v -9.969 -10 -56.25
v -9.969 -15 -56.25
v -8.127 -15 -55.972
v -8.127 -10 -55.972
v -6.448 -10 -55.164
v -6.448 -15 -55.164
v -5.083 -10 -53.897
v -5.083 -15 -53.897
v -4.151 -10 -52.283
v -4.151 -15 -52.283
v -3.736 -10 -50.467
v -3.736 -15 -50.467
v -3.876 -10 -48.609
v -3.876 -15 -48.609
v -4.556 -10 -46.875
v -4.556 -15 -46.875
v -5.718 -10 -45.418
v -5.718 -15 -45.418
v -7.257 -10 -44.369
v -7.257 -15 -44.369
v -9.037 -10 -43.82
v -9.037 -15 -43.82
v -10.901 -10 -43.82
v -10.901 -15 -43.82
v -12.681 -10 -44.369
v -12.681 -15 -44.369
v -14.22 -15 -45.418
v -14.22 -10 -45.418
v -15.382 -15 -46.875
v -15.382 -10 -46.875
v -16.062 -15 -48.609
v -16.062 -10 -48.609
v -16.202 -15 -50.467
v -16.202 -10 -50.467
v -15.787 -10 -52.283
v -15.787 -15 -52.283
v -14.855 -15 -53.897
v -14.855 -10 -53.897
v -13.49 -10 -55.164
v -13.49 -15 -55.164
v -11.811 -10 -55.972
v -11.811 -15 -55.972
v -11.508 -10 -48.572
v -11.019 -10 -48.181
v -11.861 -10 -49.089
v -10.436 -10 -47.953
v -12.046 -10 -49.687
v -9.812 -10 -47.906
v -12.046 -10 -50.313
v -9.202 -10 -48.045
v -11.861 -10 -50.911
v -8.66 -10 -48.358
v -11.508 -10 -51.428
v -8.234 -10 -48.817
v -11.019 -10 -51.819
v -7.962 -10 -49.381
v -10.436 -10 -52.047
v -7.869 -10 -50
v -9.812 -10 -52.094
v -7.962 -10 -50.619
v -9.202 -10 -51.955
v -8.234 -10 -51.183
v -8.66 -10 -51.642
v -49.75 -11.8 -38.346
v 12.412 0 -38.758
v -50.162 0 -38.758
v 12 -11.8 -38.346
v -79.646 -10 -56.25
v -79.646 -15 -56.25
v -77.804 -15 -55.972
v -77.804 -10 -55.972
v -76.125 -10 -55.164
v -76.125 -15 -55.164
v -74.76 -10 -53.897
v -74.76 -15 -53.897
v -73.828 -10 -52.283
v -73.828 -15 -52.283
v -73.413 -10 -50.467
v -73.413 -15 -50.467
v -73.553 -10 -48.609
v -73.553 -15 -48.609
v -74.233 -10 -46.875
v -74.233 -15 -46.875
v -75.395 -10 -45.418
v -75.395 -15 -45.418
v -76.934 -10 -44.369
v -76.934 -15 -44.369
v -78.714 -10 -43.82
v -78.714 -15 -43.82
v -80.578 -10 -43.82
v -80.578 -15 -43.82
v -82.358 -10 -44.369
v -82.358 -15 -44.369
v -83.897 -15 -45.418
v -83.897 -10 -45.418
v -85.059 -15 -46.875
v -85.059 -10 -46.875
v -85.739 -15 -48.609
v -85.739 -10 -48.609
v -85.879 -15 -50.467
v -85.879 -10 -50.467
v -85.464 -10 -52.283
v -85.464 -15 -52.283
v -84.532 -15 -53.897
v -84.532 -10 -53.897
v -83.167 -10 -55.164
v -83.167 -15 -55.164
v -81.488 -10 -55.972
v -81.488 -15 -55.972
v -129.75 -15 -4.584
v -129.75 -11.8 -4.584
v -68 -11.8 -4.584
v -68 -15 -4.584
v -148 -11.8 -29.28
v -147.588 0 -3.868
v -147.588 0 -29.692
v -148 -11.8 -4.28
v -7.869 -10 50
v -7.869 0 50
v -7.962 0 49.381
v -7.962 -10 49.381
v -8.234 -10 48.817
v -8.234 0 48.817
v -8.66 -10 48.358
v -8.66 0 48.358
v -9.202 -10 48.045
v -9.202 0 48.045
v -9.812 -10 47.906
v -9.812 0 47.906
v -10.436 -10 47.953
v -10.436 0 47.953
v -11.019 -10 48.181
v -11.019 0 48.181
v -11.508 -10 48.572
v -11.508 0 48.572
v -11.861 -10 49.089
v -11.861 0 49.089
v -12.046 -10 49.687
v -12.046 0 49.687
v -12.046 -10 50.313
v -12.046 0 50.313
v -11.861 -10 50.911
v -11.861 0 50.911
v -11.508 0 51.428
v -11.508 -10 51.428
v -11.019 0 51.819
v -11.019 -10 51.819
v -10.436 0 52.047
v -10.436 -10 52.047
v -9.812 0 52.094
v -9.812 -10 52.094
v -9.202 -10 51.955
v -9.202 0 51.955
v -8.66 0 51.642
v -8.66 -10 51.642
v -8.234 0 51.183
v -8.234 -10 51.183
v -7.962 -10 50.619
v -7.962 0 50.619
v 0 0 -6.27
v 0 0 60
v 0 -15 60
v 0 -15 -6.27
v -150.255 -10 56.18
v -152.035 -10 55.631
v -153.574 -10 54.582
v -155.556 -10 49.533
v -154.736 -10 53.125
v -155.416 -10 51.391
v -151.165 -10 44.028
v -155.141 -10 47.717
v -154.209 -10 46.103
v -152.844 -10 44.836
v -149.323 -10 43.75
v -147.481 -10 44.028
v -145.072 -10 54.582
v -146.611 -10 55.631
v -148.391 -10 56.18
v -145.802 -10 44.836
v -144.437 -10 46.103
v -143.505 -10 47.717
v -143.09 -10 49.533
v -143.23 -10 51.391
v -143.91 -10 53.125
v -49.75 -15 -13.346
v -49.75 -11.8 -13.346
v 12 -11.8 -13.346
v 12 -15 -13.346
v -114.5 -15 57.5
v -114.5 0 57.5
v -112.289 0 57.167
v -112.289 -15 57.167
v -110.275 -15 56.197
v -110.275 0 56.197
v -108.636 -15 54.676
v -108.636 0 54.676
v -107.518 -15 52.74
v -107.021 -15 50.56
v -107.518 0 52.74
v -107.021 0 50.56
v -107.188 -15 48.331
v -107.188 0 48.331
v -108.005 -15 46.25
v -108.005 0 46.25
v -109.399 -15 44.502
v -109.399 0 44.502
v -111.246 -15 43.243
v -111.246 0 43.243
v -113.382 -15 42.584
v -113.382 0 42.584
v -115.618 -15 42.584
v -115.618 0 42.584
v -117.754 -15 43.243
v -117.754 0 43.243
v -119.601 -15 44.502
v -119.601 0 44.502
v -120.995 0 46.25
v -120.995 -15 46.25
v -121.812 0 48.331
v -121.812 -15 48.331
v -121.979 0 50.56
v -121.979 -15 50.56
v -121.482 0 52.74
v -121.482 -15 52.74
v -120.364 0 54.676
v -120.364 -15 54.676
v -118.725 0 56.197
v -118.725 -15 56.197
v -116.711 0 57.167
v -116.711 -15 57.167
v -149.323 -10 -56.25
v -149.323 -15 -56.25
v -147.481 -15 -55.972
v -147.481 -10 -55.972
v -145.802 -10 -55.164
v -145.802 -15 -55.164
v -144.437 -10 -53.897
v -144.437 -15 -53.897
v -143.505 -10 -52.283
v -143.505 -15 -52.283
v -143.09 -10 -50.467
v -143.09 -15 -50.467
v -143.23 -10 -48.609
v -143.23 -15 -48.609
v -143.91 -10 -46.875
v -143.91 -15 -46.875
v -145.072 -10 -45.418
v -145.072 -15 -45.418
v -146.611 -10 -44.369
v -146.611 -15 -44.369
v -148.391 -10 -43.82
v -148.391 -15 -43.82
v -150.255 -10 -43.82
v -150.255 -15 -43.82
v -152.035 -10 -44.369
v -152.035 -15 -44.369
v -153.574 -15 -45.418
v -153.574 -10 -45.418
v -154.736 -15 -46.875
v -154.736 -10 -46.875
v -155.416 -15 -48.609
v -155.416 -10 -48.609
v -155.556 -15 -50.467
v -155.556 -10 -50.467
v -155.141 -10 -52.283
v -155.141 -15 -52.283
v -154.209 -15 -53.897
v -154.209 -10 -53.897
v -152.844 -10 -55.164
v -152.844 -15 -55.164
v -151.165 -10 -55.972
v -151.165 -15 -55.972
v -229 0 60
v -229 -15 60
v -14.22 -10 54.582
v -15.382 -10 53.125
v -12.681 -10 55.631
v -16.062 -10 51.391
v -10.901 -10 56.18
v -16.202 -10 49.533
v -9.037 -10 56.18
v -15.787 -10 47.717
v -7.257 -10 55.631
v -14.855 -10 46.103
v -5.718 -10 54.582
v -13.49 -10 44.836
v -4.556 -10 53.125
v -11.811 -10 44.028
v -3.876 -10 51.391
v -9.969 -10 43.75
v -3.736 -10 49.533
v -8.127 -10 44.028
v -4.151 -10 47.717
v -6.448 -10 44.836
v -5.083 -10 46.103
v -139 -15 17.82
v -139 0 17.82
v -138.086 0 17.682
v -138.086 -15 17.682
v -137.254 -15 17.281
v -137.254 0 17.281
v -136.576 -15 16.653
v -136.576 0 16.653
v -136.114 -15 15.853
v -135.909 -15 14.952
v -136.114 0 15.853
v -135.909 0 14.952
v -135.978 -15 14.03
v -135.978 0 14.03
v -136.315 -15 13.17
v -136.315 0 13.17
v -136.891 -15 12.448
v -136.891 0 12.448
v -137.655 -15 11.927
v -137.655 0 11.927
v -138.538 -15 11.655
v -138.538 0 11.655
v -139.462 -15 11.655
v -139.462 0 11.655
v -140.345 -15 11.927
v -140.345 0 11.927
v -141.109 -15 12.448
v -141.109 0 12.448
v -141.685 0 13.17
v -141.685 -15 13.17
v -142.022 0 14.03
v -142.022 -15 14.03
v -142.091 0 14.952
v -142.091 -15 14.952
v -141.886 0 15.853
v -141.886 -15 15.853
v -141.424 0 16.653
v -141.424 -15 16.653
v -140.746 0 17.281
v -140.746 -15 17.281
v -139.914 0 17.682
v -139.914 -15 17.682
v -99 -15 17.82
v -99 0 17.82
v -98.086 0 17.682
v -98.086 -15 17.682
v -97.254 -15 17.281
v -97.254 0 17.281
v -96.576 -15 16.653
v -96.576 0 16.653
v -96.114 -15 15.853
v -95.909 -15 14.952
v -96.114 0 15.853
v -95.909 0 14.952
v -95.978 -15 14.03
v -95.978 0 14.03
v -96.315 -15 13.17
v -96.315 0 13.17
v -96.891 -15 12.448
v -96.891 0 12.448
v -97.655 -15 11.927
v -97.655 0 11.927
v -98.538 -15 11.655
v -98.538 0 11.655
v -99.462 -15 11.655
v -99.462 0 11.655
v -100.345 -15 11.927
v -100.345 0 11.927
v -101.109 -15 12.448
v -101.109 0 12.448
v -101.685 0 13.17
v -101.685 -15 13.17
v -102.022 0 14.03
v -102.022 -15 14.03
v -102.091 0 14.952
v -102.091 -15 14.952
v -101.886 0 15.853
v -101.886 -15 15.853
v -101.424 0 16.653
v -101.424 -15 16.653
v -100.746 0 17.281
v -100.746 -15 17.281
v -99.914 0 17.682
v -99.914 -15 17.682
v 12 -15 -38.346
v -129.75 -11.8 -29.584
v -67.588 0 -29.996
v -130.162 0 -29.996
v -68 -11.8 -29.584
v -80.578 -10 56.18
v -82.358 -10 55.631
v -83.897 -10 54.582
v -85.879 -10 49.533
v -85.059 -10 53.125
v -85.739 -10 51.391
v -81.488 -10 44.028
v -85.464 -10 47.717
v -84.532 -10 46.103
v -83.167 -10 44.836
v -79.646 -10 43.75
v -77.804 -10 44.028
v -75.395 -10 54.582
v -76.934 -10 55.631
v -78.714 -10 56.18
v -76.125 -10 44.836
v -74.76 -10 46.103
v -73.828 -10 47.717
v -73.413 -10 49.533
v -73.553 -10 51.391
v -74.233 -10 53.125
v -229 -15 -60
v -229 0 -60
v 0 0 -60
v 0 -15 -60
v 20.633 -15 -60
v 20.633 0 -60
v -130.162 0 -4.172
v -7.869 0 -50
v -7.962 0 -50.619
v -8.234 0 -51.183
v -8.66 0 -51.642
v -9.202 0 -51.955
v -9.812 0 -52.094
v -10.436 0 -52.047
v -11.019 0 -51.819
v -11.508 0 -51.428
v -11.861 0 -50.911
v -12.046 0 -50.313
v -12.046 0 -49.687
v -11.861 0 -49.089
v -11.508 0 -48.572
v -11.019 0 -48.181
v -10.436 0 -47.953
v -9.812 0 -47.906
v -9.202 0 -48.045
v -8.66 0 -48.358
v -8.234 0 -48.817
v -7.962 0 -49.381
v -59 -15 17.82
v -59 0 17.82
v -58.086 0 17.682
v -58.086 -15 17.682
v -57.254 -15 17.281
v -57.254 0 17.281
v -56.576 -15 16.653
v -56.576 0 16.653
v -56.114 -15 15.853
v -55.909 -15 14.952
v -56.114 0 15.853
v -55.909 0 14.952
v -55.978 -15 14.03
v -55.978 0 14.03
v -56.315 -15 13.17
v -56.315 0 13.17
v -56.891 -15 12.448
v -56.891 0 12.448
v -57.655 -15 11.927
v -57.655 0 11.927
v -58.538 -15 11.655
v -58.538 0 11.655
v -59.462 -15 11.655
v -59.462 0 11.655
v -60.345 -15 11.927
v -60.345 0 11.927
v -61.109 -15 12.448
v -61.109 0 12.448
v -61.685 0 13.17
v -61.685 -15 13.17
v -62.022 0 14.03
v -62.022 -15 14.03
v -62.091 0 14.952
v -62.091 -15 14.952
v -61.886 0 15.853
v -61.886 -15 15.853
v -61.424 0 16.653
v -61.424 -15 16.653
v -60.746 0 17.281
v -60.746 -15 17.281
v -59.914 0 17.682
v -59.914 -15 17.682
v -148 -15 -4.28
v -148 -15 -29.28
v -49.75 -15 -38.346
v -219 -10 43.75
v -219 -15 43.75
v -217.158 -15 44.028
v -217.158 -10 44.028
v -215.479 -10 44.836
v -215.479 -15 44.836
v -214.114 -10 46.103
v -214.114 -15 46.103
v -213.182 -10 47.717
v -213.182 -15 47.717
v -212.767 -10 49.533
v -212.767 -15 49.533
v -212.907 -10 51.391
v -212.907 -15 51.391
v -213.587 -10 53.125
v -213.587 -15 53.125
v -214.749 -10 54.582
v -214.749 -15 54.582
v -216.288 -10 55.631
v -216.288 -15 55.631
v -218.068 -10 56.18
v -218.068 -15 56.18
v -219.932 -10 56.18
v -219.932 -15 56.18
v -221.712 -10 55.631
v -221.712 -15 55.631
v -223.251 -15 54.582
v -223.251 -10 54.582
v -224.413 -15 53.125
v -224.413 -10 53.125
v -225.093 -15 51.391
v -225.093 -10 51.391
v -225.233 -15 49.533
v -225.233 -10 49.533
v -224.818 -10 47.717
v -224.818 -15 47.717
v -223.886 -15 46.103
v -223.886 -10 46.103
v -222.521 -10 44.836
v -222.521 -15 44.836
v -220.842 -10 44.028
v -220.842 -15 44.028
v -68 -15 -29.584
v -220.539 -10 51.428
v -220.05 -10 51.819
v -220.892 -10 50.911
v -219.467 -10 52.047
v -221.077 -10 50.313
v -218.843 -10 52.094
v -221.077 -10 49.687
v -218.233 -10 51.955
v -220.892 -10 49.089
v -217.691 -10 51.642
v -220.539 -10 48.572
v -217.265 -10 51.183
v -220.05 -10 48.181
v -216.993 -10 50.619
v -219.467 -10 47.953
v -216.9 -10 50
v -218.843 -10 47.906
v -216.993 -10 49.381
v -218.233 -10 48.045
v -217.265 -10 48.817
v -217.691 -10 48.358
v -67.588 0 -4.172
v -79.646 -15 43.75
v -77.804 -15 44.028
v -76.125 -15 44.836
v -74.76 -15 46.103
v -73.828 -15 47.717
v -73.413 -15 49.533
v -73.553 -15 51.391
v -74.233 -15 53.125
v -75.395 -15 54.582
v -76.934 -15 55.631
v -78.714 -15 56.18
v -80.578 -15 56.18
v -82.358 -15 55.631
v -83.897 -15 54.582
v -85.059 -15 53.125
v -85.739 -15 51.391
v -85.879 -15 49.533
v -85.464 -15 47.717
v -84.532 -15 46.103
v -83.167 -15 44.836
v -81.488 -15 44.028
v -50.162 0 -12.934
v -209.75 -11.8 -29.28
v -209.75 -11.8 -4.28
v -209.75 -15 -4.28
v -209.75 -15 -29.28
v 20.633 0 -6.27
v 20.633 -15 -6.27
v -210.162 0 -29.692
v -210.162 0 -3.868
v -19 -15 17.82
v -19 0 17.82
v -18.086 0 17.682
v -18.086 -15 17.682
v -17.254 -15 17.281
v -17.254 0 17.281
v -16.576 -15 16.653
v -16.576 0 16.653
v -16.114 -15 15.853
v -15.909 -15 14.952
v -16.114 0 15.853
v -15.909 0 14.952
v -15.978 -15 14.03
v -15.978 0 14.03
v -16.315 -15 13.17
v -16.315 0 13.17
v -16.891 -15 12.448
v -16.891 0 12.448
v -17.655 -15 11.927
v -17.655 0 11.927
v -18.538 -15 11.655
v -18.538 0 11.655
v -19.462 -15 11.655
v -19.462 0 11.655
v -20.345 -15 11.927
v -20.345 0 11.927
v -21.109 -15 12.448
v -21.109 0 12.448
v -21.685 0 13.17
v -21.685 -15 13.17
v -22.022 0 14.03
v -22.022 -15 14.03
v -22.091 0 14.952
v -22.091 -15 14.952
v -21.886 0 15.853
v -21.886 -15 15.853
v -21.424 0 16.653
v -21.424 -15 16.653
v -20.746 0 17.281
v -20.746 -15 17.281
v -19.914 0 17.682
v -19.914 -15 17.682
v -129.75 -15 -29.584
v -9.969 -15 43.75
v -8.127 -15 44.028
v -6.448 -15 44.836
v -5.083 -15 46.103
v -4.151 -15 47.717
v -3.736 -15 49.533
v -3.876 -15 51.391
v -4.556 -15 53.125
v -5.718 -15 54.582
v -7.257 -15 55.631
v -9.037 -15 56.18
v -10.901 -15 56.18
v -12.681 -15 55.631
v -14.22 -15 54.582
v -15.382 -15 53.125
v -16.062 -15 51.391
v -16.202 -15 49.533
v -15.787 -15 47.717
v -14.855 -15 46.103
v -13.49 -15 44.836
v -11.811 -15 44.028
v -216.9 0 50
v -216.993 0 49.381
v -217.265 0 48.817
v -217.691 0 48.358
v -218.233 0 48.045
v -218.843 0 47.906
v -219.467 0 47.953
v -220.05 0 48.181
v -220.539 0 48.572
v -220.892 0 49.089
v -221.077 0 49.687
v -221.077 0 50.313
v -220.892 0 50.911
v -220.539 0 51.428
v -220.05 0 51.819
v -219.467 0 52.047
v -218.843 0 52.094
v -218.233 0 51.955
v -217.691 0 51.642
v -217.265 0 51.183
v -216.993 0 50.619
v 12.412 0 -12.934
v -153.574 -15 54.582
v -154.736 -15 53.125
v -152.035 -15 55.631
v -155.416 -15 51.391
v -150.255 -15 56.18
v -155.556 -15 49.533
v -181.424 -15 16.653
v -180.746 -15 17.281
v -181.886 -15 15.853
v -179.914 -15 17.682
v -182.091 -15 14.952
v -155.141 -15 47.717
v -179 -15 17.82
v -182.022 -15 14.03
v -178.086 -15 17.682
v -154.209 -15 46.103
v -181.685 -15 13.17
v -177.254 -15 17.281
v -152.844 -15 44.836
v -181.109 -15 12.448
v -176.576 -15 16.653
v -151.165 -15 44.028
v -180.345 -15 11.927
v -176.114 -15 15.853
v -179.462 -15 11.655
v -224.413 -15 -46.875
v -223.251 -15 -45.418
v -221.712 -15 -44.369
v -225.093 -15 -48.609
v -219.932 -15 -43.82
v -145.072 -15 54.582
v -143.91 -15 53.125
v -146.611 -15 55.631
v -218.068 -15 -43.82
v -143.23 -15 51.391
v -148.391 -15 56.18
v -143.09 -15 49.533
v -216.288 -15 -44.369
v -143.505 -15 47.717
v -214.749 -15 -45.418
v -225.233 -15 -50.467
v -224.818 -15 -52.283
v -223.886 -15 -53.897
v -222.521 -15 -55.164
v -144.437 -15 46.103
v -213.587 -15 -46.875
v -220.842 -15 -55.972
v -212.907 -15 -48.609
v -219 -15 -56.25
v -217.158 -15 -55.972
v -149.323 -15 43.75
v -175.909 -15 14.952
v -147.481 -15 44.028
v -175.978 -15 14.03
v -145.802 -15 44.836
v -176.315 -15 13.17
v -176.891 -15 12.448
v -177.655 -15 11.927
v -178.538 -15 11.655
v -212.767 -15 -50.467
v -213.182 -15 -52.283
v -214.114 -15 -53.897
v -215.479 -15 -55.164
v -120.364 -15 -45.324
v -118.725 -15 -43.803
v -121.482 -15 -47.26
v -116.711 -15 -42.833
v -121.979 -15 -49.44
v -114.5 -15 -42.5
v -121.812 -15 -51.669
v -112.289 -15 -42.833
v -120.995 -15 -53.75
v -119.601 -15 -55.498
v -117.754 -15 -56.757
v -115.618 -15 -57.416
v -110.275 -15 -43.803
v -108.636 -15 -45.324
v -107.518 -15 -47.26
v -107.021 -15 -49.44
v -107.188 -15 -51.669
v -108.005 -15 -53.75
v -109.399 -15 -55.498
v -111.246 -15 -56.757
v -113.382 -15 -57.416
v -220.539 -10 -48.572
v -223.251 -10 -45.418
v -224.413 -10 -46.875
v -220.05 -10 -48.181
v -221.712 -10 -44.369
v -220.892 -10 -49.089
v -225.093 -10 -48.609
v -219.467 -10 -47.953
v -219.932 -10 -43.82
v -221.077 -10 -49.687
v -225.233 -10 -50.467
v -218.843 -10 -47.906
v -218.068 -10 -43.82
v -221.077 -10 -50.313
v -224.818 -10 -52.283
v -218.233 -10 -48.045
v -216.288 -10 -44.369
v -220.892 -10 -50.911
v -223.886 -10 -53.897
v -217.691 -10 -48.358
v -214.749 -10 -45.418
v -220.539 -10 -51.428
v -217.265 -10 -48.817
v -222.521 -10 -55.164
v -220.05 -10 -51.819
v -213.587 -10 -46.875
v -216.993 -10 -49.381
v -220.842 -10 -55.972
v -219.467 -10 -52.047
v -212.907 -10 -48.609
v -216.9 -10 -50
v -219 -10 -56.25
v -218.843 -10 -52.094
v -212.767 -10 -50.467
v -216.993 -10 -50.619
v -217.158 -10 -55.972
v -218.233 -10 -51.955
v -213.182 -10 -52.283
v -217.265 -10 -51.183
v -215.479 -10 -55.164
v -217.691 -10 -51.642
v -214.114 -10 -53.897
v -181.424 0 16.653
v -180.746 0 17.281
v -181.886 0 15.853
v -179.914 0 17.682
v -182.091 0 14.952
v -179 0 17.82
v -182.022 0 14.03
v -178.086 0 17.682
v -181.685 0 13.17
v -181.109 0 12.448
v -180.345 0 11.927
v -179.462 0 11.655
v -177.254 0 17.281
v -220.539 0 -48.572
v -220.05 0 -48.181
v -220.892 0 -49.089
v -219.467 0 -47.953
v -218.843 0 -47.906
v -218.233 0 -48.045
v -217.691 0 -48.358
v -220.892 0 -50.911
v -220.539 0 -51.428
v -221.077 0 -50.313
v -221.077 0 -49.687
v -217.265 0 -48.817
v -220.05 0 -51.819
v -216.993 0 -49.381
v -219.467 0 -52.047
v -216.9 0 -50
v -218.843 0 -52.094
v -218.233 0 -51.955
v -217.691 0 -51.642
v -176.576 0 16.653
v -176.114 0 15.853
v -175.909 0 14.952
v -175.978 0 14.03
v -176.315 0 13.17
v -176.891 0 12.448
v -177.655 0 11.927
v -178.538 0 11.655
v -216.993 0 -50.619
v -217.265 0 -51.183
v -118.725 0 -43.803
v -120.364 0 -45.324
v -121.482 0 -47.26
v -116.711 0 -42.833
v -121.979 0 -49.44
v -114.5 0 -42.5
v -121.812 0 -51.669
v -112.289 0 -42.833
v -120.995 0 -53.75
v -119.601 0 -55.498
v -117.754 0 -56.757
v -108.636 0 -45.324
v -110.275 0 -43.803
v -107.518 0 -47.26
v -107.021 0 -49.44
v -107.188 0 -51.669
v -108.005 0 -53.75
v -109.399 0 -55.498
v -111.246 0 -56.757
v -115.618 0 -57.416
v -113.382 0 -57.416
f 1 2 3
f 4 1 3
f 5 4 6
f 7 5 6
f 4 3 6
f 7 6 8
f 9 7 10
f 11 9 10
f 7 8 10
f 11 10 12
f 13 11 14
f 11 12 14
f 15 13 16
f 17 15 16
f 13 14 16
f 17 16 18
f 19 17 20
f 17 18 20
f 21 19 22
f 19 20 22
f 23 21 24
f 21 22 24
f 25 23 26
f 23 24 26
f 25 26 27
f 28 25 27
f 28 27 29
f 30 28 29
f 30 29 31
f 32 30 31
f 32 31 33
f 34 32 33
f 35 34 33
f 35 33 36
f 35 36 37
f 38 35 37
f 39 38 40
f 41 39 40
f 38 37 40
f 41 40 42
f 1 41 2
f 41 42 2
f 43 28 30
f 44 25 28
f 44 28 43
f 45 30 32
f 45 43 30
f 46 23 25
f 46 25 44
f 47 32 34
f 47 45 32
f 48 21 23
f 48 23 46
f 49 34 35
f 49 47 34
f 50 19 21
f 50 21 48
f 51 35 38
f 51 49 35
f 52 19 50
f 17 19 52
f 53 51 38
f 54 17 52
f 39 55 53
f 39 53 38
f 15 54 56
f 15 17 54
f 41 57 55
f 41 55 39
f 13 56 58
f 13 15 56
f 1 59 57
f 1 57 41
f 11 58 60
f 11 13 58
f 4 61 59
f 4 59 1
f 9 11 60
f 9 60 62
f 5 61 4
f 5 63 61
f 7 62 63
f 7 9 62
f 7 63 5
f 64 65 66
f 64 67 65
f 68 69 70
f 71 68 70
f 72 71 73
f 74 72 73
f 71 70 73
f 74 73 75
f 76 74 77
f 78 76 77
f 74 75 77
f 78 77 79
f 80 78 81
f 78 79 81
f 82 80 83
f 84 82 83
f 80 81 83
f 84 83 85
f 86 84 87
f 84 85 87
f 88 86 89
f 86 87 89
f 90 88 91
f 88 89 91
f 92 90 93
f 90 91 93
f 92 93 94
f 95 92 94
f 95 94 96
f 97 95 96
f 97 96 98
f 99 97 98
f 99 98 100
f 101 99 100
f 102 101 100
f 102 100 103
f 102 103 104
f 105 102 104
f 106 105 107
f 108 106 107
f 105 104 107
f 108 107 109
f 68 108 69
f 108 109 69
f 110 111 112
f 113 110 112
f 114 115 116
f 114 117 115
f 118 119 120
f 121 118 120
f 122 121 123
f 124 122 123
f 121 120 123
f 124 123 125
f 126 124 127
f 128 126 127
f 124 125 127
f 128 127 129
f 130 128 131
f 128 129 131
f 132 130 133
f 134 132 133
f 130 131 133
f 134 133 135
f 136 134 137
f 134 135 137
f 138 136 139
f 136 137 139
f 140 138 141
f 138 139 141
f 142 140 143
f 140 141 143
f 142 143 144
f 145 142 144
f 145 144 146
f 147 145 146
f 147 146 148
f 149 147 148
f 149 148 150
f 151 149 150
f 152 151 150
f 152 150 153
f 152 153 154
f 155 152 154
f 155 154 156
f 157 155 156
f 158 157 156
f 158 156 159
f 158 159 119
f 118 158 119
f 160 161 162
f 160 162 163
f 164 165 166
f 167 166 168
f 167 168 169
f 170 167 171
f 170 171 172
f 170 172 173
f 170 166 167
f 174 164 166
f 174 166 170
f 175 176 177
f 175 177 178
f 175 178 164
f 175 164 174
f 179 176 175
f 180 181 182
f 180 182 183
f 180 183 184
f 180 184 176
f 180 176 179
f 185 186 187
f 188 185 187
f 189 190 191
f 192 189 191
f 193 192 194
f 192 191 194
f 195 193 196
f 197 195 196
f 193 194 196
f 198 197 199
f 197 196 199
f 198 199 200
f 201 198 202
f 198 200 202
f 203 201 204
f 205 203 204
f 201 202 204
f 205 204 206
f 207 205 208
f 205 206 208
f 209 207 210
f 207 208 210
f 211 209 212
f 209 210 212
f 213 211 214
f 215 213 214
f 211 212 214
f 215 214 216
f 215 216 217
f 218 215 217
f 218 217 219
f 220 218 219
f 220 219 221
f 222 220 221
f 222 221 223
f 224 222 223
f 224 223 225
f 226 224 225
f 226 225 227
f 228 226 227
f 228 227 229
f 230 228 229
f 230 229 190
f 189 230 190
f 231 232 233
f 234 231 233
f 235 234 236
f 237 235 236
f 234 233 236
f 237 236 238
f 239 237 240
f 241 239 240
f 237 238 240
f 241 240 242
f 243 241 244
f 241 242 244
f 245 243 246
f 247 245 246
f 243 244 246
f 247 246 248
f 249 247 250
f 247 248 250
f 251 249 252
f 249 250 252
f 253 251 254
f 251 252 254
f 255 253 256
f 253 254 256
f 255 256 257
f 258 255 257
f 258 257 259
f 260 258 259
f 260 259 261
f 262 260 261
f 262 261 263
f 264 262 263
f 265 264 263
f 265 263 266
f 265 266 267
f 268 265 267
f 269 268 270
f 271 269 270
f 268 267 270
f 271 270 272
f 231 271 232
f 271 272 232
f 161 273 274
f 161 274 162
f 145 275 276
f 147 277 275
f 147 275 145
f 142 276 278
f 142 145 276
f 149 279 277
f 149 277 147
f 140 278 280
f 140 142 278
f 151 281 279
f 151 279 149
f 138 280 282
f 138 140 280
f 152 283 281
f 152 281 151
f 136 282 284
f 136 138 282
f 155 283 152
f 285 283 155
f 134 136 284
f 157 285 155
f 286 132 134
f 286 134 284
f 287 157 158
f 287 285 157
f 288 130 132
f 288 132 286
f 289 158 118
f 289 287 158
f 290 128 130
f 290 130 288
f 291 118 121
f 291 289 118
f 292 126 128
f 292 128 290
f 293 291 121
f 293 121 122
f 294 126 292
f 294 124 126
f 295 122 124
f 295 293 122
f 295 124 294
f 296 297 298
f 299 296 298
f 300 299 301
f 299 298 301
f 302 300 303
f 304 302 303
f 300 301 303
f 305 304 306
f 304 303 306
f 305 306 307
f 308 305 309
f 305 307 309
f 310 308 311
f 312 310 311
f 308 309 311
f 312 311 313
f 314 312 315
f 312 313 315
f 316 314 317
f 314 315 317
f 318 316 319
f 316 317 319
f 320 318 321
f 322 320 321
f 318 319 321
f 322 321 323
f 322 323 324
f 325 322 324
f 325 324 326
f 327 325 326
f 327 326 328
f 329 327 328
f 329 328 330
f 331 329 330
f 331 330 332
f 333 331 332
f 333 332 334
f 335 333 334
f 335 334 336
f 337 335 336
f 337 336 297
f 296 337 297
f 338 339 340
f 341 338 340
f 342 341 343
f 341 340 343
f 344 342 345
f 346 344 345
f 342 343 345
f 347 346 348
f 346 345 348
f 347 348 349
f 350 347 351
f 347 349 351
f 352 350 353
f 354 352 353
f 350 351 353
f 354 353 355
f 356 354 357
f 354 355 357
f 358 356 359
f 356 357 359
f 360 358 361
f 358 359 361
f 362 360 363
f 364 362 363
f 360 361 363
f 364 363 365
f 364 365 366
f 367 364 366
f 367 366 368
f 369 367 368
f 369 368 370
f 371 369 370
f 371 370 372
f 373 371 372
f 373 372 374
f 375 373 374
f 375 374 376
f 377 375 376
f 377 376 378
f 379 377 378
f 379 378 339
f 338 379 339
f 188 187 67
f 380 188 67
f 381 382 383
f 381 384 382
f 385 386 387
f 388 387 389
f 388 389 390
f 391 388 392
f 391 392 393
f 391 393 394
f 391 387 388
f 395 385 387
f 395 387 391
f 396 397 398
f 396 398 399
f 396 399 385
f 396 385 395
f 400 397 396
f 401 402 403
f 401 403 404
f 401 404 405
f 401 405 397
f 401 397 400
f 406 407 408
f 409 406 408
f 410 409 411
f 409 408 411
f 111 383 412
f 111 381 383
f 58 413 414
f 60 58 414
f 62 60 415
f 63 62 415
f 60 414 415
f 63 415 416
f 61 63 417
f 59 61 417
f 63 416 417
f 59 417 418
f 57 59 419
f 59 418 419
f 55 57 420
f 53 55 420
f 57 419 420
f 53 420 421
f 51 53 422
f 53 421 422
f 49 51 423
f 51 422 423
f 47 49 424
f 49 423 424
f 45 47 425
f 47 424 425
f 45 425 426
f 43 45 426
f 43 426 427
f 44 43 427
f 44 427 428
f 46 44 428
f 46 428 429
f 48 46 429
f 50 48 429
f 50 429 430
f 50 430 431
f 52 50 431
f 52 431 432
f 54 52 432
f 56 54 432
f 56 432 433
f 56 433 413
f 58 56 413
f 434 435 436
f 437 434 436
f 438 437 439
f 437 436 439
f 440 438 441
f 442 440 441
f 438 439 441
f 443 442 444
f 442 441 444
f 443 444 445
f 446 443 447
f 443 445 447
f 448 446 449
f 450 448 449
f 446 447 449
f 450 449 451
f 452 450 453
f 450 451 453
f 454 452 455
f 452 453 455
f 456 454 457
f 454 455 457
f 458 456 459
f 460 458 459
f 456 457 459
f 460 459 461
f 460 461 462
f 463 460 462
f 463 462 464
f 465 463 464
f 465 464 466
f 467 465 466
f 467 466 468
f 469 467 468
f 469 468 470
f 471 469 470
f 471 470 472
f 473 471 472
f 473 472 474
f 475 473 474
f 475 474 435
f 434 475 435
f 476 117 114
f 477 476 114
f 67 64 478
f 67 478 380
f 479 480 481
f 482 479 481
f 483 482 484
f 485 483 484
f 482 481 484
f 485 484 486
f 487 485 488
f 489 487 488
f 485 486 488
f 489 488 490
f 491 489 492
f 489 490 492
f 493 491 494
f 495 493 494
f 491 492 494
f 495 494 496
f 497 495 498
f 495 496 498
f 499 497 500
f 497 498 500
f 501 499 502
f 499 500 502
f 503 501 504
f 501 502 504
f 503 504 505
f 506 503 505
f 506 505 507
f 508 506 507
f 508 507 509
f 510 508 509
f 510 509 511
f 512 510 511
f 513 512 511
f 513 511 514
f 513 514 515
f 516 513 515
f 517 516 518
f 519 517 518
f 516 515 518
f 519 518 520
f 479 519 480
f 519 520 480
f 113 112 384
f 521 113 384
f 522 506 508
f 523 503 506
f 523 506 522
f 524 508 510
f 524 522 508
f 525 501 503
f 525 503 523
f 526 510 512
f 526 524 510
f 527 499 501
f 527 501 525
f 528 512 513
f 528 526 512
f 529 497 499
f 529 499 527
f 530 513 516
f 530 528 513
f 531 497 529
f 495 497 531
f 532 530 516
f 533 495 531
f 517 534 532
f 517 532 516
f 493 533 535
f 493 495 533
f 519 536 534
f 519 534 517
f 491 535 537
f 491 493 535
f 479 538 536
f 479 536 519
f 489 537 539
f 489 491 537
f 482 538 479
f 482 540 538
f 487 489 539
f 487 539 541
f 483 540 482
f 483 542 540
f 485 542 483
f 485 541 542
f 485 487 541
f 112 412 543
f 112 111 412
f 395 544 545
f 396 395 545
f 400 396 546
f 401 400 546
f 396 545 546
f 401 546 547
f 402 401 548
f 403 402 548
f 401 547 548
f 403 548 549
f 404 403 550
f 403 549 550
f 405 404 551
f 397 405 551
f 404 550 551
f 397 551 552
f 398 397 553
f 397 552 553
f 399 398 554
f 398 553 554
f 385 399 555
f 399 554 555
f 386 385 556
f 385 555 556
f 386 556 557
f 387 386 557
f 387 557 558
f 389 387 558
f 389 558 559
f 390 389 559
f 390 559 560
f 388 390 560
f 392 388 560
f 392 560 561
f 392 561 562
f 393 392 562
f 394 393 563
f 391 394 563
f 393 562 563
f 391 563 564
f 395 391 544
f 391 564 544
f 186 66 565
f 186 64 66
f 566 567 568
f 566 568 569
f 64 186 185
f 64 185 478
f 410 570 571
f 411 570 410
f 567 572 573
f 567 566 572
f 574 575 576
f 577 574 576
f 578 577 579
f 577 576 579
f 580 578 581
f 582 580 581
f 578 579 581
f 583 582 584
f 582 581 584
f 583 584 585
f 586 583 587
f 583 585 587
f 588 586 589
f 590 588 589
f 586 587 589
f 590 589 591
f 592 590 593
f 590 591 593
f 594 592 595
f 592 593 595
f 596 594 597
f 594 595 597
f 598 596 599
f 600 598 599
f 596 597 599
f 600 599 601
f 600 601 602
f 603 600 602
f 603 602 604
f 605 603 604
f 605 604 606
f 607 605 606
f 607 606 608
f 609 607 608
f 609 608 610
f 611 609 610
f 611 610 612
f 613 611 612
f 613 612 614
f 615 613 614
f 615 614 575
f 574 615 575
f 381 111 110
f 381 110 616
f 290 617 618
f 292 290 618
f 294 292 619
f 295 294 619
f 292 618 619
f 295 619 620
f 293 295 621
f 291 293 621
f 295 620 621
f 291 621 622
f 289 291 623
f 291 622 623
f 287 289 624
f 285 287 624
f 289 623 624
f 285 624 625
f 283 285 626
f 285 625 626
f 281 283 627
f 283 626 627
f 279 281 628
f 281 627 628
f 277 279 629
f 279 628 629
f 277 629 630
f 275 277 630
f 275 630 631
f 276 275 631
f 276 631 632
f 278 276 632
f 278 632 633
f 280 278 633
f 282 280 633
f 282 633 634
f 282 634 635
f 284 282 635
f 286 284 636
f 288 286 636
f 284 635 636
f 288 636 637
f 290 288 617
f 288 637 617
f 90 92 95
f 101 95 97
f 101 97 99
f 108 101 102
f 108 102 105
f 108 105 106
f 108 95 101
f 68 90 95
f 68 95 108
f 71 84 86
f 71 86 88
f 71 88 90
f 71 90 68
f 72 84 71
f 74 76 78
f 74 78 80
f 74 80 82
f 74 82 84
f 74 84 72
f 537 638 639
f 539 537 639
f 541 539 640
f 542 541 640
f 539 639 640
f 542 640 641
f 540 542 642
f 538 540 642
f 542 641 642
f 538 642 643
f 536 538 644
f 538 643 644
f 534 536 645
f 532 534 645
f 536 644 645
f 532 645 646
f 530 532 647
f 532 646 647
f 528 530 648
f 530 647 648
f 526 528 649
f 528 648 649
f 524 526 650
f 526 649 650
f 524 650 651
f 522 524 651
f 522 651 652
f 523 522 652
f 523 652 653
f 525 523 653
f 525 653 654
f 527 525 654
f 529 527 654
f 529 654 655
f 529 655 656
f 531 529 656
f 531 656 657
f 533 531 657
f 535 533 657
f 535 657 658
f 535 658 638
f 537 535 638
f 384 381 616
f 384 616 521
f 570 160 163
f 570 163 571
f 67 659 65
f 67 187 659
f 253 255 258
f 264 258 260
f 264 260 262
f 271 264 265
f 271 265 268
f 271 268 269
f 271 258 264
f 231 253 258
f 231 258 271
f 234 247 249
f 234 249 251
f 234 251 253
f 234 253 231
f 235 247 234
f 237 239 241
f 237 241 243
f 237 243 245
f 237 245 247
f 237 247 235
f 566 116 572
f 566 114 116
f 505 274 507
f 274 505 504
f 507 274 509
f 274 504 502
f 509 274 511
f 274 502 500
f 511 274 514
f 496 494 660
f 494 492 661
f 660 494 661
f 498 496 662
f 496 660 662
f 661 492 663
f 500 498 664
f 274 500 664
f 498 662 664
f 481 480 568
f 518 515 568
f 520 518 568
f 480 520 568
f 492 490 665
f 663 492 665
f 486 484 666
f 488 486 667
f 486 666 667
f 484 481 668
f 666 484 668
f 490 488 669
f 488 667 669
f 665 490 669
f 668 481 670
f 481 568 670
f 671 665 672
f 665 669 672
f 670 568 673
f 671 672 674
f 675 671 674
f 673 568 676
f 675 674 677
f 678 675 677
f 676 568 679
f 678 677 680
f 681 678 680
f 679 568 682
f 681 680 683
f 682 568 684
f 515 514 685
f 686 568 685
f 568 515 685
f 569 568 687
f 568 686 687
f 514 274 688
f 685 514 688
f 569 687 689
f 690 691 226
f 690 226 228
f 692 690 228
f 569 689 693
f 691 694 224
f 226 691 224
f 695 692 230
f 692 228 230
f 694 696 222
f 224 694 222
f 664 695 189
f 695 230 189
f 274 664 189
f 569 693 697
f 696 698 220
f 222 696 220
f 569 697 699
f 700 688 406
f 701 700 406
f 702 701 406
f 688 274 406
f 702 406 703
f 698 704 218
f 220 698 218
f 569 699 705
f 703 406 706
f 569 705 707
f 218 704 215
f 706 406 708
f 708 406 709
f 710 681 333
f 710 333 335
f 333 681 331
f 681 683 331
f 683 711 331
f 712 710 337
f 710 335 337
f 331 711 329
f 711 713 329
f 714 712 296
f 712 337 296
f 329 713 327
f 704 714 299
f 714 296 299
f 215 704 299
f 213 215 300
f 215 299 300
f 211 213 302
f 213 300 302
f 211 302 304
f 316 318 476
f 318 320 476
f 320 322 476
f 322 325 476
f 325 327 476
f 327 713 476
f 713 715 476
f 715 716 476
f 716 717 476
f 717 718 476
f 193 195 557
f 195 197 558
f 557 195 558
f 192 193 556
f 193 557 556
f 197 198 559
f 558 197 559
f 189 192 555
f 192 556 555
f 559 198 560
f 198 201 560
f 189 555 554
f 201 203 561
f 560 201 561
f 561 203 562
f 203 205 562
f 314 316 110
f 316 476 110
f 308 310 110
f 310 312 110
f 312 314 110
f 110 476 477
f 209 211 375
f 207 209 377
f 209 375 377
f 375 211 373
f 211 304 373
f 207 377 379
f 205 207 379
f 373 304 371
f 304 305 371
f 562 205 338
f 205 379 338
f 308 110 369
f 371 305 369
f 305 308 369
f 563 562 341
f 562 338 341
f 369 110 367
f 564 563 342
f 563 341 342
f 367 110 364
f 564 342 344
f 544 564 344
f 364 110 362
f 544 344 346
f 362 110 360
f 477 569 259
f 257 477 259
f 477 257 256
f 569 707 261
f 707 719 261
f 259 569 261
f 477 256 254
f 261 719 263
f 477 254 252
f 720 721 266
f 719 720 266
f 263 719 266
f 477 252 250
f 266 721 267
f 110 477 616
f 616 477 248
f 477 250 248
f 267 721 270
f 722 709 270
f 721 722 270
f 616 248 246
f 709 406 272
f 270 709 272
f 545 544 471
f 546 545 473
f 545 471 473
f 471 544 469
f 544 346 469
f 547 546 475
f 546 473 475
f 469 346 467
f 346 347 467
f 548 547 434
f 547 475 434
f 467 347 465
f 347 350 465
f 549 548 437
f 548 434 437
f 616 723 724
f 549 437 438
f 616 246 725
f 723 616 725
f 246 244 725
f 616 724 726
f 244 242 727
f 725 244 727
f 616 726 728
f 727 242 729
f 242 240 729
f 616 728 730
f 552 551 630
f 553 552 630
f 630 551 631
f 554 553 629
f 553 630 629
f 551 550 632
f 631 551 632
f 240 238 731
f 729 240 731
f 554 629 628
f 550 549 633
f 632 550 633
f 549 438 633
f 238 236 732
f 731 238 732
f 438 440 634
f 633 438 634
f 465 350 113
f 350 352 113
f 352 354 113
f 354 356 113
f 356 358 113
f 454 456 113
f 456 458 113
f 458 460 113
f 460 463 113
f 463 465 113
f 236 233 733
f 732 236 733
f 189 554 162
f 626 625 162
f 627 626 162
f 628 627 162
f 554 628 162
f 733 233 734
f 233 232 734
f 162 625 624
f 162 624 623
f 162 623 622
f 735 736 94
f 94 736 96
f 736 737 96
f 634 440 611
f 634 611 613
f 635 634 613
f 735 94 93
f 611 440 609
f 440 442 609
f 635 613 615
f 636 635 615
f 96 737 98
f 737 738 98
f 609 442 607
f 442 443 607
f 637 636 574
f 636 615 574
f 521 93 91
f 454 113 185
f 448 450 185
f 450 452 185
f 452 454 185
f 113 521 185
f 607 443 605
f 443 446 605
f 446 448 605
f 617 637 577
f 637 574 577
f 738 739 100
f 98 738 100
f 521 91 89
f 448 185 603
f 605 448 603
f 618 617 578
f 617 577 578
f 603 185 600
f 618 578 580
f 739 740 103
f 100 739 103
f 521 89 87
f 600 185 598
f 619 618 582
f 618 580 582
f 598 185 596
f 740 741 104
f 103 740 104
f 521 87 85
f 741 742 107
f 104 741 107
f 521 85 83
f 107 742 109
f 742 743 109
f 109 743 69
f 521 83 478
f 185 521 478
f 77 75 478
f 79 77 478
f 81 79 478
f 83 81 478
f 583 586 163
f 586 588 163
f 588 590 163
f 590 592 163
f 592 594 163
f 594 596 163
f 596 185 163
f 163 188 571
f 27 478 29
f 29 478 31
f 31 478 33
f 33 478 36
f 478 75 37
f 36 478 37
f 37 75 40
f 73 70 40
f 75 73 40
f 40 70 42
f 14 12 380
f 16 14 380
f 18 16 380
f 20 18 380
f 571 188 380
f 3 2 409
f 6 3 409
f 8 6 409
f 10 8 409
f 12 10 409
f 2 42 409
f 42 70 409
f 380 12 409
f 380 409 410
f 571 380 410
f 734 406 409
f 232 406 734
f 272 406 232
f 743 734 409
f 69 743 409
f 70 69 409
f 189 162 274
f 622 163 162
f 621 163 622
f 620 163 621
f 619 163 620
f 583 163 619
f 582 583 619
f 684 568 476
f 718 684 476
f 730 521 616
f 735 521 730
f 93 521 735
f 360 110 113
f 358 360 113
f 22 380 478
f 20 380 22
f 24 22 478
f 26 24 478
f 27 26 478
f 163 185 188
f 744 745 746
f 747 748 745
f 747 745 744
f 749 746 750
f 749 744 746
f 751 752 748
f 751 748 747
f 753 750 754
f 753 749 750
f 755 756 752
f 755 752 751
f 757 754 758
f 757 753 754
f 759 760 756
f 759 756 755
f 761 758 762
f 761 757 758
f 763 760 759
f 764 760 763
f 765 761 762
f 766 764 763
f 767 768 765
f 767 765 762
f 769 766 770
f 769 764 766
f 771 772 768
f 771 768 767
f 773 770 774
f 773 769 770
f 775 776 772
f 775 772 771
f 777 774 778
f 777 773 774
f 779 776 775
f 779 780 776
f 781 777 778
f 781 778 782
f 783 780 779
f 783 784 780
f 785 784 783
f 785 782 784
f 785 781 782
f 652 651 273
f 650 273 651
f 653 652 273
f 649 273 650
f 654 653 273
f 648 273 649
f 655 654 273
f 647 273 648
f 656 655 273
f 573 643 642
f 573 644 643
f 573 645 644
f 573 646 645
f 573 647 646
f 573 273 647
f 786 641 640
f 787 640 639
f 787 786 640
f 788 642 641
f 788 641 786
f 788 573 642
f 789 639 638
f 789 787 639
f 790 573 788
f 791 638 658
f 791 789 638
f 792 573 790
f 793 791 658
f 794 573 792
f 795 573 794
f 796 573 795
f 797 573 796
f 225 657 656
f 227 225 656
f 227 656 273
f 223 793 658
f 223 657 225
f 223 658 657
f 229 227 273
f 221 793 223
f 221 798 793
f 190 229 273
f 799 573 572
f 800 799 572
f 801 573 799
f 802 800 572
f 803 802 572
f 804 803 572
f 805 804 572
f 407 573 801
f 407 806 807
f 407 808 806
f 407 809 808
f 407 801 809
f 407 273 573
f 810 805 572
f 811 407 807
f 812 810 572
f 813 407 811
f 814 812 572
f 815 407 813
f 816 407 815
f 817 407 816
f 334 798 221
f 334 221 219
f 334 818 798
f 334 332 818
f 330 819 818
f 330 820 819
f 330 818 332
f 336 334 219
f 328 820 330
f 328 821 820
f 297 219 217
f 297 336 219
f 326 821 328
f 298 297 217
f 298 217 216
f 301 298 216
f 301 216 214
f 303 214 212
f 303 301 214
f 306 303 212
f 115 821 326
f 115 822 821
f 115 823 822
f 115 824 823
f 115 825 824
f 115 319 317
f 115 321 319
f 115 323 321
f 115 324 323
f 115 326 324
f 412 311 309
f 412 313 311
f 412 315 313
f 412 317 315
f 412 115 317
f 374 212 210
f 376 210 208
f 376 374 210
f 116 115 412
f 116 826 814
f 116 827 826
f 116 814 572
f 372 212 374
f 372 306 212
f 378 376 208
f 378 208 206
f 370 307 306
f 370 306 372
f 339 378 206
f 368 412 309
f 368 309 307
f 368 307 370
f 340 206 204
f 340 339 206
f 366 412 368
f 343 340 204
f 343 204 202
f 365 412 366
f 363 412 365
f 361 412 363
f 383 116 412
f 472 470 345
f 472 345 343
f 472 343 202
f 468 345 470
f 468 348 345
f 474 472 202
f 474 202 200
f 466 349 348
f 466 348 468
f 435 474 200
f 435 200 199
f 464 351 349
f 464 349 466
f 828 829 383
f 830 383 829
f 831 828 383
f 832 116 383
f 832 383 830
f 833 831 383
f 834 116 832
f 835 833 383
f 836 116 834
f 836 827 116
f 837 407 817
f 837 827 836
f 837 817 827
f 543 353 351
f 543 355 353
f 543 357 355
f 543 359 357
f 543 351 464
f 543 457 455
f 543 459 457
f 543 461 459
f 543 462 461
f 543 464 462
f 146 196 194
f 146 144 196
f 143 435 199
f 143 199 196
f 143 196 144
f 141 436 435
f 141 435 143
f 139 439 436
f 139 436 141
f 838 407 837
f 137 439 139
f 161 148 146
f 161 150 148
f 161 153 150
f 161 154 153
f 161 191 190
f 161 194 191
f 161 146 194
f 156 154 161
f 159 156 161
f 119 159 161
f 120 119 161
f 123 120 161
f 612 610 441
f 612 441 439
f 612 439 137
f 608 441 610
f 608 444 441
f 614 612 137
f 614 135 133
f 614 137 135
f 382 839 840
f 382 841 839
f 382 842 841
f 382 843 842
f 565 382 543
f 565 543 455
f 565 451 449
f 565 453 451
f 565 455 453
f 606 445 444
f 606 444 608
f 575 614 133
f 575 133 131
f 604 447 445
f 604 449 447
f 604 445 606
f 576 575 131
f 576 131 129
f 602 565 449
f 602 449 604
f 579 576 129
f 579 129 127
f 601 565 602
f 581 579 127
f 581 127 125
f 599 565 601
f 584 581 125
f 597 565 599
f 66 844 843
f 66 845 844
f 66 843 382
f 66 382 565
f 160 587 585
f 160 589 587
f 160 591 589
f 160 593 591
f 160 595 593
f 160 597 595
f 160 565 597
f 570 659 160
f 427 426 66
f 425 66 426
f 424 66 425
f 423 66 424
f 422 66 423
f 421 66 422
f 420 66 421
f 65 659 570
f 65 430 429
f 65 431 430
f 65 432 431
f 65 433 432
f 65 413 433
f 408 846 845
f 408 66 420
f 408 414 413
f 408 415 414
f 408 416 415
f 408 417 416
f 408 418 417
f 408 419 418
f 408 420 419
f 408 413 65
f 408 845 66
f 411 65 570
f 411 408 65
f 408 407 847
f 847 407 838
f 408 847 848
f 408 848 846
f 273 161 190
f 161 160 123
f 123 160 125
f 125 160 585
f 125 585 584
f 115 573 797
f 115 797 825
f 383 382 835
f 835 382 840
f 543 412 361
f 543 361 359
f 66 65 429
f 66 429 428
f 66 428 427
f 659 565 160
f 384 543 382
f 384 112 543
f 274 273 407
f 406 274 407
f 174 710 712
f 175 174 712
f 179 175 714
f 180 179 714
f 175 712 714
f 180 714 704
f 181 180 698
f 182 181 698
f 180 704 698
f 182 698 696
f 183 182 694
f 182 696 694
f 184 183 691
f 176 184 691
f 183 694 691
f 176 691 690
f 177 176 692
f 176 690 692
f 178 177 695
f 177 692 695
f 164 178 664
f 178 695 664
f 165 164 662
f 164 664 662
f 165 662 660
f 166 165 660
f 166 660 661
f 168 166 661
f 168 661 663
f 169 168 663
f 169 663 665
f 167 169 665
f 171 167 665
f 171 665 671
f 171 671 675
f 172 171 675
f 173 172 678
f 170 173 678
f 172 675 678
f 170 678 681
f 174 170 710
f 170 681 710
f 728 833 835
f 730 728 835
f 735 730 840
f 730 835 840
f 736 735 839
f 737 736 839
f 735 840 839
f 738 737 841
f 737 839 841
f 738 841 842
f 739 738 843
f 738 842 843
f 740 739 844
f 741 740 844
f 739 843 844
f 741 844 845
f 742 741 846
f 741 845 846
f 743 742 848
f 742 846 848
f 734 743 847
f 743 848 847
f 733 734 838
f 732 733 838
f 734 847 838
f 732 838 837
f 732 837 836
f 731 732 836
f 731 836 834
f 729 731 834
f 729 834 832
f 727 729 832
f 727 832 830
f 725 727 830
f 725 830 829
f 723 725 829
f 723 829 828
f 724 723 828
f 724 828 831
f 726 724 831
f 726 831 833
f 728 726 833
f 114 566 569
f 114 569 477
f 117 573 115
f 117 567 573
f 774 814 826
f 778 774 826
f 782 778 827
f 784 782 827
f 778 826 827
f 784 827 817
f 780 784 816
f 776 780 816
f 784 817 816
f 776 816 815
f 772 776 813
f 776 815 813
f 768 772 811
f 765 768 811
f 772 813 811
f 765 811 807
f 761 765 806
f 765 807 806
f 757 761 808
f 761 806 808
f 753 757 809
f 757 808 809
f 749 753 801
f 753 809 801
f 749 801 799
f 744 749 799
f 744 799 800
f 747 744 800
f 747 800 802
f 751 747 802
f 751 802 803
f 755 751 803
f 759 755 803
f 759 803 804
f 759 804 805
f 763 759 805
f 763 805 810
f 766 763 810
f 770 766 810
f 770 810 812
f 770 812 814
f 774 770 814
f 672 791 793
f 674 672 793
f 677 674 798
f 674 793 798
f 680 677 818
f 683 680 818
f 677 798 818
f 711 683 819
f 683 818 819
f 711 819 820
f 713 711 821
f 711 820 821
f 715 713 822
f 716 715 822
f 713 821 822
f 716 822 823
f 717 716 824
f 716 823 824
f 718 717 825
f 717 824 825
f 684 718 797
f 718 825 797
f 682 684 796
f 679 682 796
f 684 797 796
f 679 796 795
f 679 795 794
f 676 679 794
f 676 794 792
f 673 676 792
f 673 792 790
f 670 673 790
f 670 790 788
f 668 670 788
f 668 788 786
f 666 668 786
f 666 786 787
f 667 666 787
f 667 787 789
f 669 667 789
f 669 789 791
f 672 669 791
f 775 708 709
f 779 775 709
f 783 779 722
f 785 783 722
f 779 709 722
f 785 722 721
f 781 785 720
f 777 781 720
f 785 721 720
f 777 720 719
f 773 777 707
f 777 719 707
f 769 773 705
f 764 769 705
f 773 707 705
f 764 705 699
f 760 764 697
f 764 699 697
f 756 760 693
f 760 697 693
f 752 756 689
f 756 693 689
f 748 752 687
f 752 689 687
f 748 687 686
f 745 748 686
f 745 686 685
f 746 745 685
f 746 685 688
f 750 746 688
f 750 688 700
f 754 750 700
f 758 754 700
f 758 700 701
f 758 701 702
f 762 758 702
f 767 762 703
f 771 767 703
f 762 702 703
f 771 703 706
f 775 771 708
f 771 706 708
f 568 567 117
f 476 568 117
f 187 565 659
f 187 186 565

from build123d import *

# Parameters (mm, degrees)
SKETCH1_W            = 229
SKETCH1_H            = 120
BOSS_EXTRUDE1_DEPTH  = 15
SKETCH2_W            = 20.632503002
SKETCH2_H            = 53.730004003
BOSS_EXTRUDE2_DEPTH  = 15
CUT_EXTRUDE1_REACH   = 239.205
SKETCH3_W            = 61.75
SKETCH3_H            = 25
CUT_EXTRUDE2_REACH   = 239.205
SKETCH4_W            = 61.75
SKETCH4_H            = 25
CUT_EXTRUDE5_REACH   = 239.205
SKETCH10_W           = 61.75
SKETCH10_H           = 25
CUT_EXTRUDE3_REACH   = 239.205
SKETCH5_R            = 7.5
SKETCH9_R            = 6.25
CUT_EXTRUDE4_DEPTH   = 5
LPATTERN2_COUNT      = 4
LPATTERN2_PITCH      = 69.677
LPATTERN2_COUNT_DIR2 = 2
LPATTERN2_PITCH_DIR2 = 100
M5_TAPPED_HOLE1_D    = 4.2
CUT_EXTRUDE6_REACH   = 239.205
SKETCH14_R           = 3.1


with BuildPart() as part:
    # Sketch1 → Boss-Extrude1 (new body)
    with BuildSketch(Plane(origin=(0, 0, 0), x_dir=(1, 0, 0), z_dir=(0, 1, 0))):
        with Locations((-114.5, 0)):
            Rectangle(SKETCH1_W, SKETCH1_H)
    extrude(amount=-BOSS_EXTRUDE1_DEPTH)

    # Sketch2 → Boss-Extrude2 (add)
    with BuildSketch(Plane(origin=(0, 0, 0), x_dir=(1, 0, 0), z_dir=(0, 1, 0))):
        with Locations((10.316251501, 33.134997999)):
            Rectangle(SKETCH2_W, SKETCH2_H)
    extrude(amount=-BOSS_EXTRUDE2_DEPTH)

    # Sketch3 → Cut-Extrude1 (cut, up to next)
    with BuildSketch(Plane(origin=(0, 0, 0), x_dir=(1, 0, 0), z_dir=(0, 1, 0)), mode=Mode.PRIVATE) as cut_extrude1_sk1:
        with Locations((-18.875, 25.846108513)):
            Rectangle(SKETCH3_W, SKETCH3_H)
    cut_extrude1_tool1 = extrude(cut_extrude1_sk1.sketch, amount=-CUT_EXTRUDE1_REACH, mode=Mode.PRIVATE) & part.part
    add(cut_extrude1_tool1.solids().sort_by_distance((-18.875, 0, -25.846109))[0], mode=Mode.SUBTRACT)

    # Sketch4 → Cut-Extrude2 (cut, up to next)
    with BuildSketch(Plane(origin=(0, 0, 0), x_dir=(1, 0, 0), z_dir=(0, 1, 0)), mode=Mode.PRIVATE) as cut_extrude2_sk1:
        with Locations((-98.875, 17.083858316)):
            Rectangle(SKETCH4_W, SKETCH4_H)
    cut_extrude2_tool1 = extrude(cut_extrude2_sk1.sketch, amount=-CUT_EXTRUDE2_REACH, mode=Mode.PRIVATE) & part.part
    add(cut_extrude2_tool1.solids().sort_by_distance((-98.875, 0, -17.083858))[0], mode=Mode.SUBTRACT)

    # Sketch10 → Cut-Extrude5 (cut, up to next)
    with BuildSketch(Plane(origin=(0, 0, 0), x_dir=(1, 0, 0), z_dir=(0, 1, 0)), mode=Mode.PRIVATE) as cut_extrude5_sk1:
        with Locations((-178.875, 16.78)):
            Rectangle(SKETCH10_W, SKETCH10_H)
    cut_extrude5_tool1 = extrude(cut_extrude5_sk1.sketch, amount=-CUT_EXTRUDE5_REACH, mode=Mode.PRIVATE) & part.part
    add(cut_extrude5_tool1.solids().sort_by_distance((-178.875, 0, -16.78))[0], mode=Mode.SUBTRACT)

    # Sketch5 → Cut-Extrude3 (cut, up to next)
    with BuildSketch(Plane(origin=(0, 0, 0), x_dir=(1, 0, 0), z_dir=(0, 1, 0)), mode=Mode.PRIVATE) as cut_extrude3_sk1:
        with Locations(Location((-114.5, 50, 0), (0, 0, 270))):
            Circle(SKETCH5_R)
    cut_extrude3_tool1 = extrude(cut_extrude3_sk1.sketch, amount=-CUT_EXTRUDE3_REACH, mode=Mode.PRIVATE) & part.part
    # Sketch5 → Cut-Extrude3 (cut, up to next)
    with BuildSketch(Plane(origin=(0, 0, 0), x_dir=(1, 0, 0), z_dir=(0, 1, 0)), mode=Mode.PRIVATE) as cut_extrude3_sk2:
        with Locations(Location((-114.5, -50, 0), (0, 0, 270))):
            Circle(SKETCH5_R)
    cut_extrude3_tool2 = extrude(cut_extrude3_sk2.sketch, amount=-CUT_EXTRUDE3_REACH, mode=Mode.PRIVATE) & part.part
    add(cut_extrude3_tool1.solids().sort_by_distance((-114.5, 0, -50))[0], mode=Mode.SUBTRACT)
    add(cut_extrude3_tool2.solids().sort_by_distance((-114.5, 0, 50))[0], mode=Mode.SUBTRACT)

    # Sketch9 → Cut-Extrude4 (cut)
    with BuildSketch(Plane.XZ.offset(15)):
        with Locations(Location((-219, -50, 0), (0, 0, 270))):
            Circle(SKETCH9_R)
    cut_extrude4 = extrude(amount=-CUT_EXTRUDE4_DEPTH, mode=Mode.SUBTRACT)

    # LPattern2: Cut-Extrude4 4 × 2
    with Locations(*[(i * LPATTERN2_PITCH, 0, j * LPATTERN2_PITCH_DIR2) for i in range(LPATTERN2_COUNT) for j in range(LPATTERN2_COUNT_DIR2) if (i, j) != (0, 0)]):
        add(cut_extrude4, mode=Mode.SUBTRACT)

    # M5 Tapped Hole1 (through all)
    with Locations(Plane(origin=(0, -10, 0), x_dir=(-1, 0, 0), z_dir=(0, -1, 0))):
        with Locations((9.969, 50), (219, 50), (219, -50), (9.969, -50)):
            Hole(M5_TAPPED_HOLE1_D / 2)

    # Draft1: read off the stored shape, not the designer's step
    # Draft1: loft between two sections, ruled curve by curve
    draft1_from = [
        Edge.make_line((-50.16206508, 0, -38.758173593), (-50.16206508, 0, -12.934043433)),
        Edge.make_line((12.41206508, 0, -38.758173593), (-50.16206508, 0, -38.758173593)),
        Edge.make_line((12.41206508, 0, -12.934043433), (12.41206508, 0, -38.758173593)),
        Edge.make_line((-50.16206508, 0, -12.934043433), (12.41206508, 0, -12.934043433)),
    ]
    draft1_to = [
        Edge.make_line((-49.75, -11.8, -38.346108513), (-49.75, -11.8, -13.346108513)),
        Edge.make_line((12, -11.8, -38.346108513), (-49.75, -11.8, -38.346108513)),
        Edge.make_line((12, -11.8, -13.346108513), (12, -11.8, -38.346108513)),
        Edge.make_line((-49.75, -11.8, -13.346108513), (12, -11.8, -13.346108513)),
    ]
    draft1 = Solid(Shell([*[Face.make_surface_from_curves(draft1_from[k], draft1_to[k]) for k in range(4)], Face(Wire(draft1_from)), Face(Wire(draft1_to))]))
    add(draft1, mode=Mode.SUBTRACT)

    # Draft1 2: loft between two sections, ruled curve by curve
    draft1_2_from = [
        Edge.make_line((-130.16206508, 0, -29.995923396), (-130.16206508, 0, -4.171793236)),
        Edge.make_line((-67.58793492, 0, -29.995923396), (-130.16206508, 0, -29.995923396)),
        Edge.make_line((-67.58793492, 0, -4.171793236), (-67.58793492, 0, -29.995923396)),
        Edge.make_line((-130.16206508, 0, -4.171793236), (-67.58793492, 0, -4.171793236)),
    ]
    draft1_2_to = [
        Edge.make_line((-129.75, -11.8, -29.583858316), (-129.75, -11.8, -4.583858316)),
        Edge.make_line((-68, -11.8, -29.583858316), (-129.75, -11.8, -29.583858316)),
        Edge.make_line((-68, -11.8, -4.583858316), (-68, -11.8, -29.583858316)),
        Edge.make_line((-129.75, -11.8, -4.583858316), (-68, -11.8, -4.583858316)),
    ]
    draft1_2 = Solid(Shell([*[Face.make_surface_from_curves(draft1_2_from[k], draft1_2_to[k]) for k in range(4)], Face(Wire(draft1_2_from)), Face(Wire(draft1_2_to))]))
    add(draft1_2, mode=Mode.SUBTRACT)

    # Draft1 3: loft between two sections, ruled curve by curve
    draft1_3_from = [
        Edge.make_line((-210.16206508, 0, -29.69206508), (-210.16206508, 0, -3.86793492)),
        Edge.make_line((-147.58793492, 0, -29.69206508), (-210.16206508, 0, -29.69206508)),
        Edge.make_line((-147.58793492, 0, -3.86793492), (-147.58793492, 0, -29.69206508)),
        Edge.make_line((-210.16206508, 0, -3.86793492), (-147.58793492, 0, -3.86793492)),
    ]
    draft1_3_to = [
        Edge.make_line((-209.75, -11.8, -29.28), (-209.75, -11.8, -4.28)),
        Edge.make_line((-148, -11.8, -29.28), (-209.75, -11.8, -29.28)),
        Edge.make_line((-148, -11.8, -4.28), (-148, -11.8, -29.28)),
        Edge.make_line((-209.75, -11.8, -4.28), (-148, -11.8, -4.28)),
    ]
    draft1_3 = Solid(Shell([*[Face.make_surface_from_curves(draft1_3_from[k], draft1_3_to[k]) for k in range(4)], Face(Wire(draft1_3_from)), Face(Wire(draft1_3_to))]))
    add(draft1_3, mode=Mode.SUBTRACT)

    # Sketch14 → Cut-Extrude6 (cut, up to next)
    with BuildSketch(Plane(origin=(0, 0, 0), x_dir=(1, 0, 0), z_dir=(0, 1, 0)), mode=Mode.PRIVATE) as cut_extrude6_sk1:
        with Locations(Location((-179, -14.72, 0), (0, 0, 270))):
            Circle(SKETCH14_R)
    cut_extrude6_tool1 = extrude(cut_extrude6_sk1.sketch, amount=-CUT_EXTRUDE6_REACH, mode=Mode.PRIVATE) & part.part
    # Sketch14 → Cut-Extrude6 (cut, up to next)
    with BuildSketch(Plane(origin=(0, 0, 0), x_dir=(1, 0, 0), z_dir=(0, 1, 0)), mode=Mode.PRIVATE) as cut_extrude6_sk2:
        with Locations(Location((-139, -14.72, 0), (0, 0, 270))):
            Circle(SKETCH14_R)
    cut_extrude6_tool2 = extrude(cut_extrude6_sk2.sketch, amount=-CUT_EXTRUDE6_REACH, mode=Mode.PRIVATE) & part.part
    # Sketch14 → Cut-Extrude6 (cut, up to next)
    with BuildSketch(Plane(origin=(0, 0, 0), x_dir=(1, 0, 0), z_dir=(0, 1, 0)), mode=Mode.PRIVATE) as cut_extrude6_sk3:
        with Locations(Location((-99, -14.72, 0), (0, 0, 270))):
            Circle(SKETCH14_R)
    cut_extrude6_tool3 = extrude(cut_extrude6_sk3.sketch, amount=-CUT_EXTRUDE6_REACH, mode=Mode.PRIVATE) & part.part
    # Sketch14 → Cut-Extrude6 (cut, up to next)
    with BuildSketch(Plane(origin=(0, 0, 0), x_dir=(1, 0, 0), z_dir=(0, 1, 0)), mode=Mode.PRIVATE) as cut_extrude6_sk4:
        with Locations(Location((-59, -14.72, 0), (0, 0, 270))):
            Circle(SKETCH14_R)
    cut_extrude6_tool4 = extrude(cut_extrude6_sk4.sketch, amount=-CUT_EXTRUDE6_REACH, mode=Mode.PRIVATE) & part.part
    # Sketch14 → Cut-Extrude6 (cut, up to next)
    with BuildSketch(Plane(origin=(0, 0, 0), x_dir=(1, 0, 0), z_dir=(0, 1, 0)), mode=Mode.PRIVATE) as cut_extrude6_sk5:
        with Locations(Location((-19, -14.72, 0), (0, 0, 270))):
            Circle(SKETCH14_R)
    cut_extrude6_tool5 = extrude(cut_extrude6_sk5.sketch, amount=-CUT_EXTRUDE6_REACH, mode=Mode.PRIVATE) & part.part
    add(cut_extrude6_tool1.solids().sort_by_distance((-179, 0, 14.72))[0], mode=Mode.SUBTRACT)
    add(cut_extrude6_tool2.solids().sort_by_distance((-139, 0, 14.72))[0], mode=Mode.SUBTRACT)
    add(cut_extrude6_tool3.solids().sort_by_distance((-99, 0, 14.72))[0], mode=Mode.SUBTRACT)
    add(cut_extrude6_tool4.solids().sort_by_distance((-59, 0, 14.72))[0], mode=Mode.SUBTRACT)
    add(cut_extrude6_tool5.solids().sort_by_distance((-19, 0, 14.72))[0], mode=Mode.SUBTRACT)


solid = part.part
